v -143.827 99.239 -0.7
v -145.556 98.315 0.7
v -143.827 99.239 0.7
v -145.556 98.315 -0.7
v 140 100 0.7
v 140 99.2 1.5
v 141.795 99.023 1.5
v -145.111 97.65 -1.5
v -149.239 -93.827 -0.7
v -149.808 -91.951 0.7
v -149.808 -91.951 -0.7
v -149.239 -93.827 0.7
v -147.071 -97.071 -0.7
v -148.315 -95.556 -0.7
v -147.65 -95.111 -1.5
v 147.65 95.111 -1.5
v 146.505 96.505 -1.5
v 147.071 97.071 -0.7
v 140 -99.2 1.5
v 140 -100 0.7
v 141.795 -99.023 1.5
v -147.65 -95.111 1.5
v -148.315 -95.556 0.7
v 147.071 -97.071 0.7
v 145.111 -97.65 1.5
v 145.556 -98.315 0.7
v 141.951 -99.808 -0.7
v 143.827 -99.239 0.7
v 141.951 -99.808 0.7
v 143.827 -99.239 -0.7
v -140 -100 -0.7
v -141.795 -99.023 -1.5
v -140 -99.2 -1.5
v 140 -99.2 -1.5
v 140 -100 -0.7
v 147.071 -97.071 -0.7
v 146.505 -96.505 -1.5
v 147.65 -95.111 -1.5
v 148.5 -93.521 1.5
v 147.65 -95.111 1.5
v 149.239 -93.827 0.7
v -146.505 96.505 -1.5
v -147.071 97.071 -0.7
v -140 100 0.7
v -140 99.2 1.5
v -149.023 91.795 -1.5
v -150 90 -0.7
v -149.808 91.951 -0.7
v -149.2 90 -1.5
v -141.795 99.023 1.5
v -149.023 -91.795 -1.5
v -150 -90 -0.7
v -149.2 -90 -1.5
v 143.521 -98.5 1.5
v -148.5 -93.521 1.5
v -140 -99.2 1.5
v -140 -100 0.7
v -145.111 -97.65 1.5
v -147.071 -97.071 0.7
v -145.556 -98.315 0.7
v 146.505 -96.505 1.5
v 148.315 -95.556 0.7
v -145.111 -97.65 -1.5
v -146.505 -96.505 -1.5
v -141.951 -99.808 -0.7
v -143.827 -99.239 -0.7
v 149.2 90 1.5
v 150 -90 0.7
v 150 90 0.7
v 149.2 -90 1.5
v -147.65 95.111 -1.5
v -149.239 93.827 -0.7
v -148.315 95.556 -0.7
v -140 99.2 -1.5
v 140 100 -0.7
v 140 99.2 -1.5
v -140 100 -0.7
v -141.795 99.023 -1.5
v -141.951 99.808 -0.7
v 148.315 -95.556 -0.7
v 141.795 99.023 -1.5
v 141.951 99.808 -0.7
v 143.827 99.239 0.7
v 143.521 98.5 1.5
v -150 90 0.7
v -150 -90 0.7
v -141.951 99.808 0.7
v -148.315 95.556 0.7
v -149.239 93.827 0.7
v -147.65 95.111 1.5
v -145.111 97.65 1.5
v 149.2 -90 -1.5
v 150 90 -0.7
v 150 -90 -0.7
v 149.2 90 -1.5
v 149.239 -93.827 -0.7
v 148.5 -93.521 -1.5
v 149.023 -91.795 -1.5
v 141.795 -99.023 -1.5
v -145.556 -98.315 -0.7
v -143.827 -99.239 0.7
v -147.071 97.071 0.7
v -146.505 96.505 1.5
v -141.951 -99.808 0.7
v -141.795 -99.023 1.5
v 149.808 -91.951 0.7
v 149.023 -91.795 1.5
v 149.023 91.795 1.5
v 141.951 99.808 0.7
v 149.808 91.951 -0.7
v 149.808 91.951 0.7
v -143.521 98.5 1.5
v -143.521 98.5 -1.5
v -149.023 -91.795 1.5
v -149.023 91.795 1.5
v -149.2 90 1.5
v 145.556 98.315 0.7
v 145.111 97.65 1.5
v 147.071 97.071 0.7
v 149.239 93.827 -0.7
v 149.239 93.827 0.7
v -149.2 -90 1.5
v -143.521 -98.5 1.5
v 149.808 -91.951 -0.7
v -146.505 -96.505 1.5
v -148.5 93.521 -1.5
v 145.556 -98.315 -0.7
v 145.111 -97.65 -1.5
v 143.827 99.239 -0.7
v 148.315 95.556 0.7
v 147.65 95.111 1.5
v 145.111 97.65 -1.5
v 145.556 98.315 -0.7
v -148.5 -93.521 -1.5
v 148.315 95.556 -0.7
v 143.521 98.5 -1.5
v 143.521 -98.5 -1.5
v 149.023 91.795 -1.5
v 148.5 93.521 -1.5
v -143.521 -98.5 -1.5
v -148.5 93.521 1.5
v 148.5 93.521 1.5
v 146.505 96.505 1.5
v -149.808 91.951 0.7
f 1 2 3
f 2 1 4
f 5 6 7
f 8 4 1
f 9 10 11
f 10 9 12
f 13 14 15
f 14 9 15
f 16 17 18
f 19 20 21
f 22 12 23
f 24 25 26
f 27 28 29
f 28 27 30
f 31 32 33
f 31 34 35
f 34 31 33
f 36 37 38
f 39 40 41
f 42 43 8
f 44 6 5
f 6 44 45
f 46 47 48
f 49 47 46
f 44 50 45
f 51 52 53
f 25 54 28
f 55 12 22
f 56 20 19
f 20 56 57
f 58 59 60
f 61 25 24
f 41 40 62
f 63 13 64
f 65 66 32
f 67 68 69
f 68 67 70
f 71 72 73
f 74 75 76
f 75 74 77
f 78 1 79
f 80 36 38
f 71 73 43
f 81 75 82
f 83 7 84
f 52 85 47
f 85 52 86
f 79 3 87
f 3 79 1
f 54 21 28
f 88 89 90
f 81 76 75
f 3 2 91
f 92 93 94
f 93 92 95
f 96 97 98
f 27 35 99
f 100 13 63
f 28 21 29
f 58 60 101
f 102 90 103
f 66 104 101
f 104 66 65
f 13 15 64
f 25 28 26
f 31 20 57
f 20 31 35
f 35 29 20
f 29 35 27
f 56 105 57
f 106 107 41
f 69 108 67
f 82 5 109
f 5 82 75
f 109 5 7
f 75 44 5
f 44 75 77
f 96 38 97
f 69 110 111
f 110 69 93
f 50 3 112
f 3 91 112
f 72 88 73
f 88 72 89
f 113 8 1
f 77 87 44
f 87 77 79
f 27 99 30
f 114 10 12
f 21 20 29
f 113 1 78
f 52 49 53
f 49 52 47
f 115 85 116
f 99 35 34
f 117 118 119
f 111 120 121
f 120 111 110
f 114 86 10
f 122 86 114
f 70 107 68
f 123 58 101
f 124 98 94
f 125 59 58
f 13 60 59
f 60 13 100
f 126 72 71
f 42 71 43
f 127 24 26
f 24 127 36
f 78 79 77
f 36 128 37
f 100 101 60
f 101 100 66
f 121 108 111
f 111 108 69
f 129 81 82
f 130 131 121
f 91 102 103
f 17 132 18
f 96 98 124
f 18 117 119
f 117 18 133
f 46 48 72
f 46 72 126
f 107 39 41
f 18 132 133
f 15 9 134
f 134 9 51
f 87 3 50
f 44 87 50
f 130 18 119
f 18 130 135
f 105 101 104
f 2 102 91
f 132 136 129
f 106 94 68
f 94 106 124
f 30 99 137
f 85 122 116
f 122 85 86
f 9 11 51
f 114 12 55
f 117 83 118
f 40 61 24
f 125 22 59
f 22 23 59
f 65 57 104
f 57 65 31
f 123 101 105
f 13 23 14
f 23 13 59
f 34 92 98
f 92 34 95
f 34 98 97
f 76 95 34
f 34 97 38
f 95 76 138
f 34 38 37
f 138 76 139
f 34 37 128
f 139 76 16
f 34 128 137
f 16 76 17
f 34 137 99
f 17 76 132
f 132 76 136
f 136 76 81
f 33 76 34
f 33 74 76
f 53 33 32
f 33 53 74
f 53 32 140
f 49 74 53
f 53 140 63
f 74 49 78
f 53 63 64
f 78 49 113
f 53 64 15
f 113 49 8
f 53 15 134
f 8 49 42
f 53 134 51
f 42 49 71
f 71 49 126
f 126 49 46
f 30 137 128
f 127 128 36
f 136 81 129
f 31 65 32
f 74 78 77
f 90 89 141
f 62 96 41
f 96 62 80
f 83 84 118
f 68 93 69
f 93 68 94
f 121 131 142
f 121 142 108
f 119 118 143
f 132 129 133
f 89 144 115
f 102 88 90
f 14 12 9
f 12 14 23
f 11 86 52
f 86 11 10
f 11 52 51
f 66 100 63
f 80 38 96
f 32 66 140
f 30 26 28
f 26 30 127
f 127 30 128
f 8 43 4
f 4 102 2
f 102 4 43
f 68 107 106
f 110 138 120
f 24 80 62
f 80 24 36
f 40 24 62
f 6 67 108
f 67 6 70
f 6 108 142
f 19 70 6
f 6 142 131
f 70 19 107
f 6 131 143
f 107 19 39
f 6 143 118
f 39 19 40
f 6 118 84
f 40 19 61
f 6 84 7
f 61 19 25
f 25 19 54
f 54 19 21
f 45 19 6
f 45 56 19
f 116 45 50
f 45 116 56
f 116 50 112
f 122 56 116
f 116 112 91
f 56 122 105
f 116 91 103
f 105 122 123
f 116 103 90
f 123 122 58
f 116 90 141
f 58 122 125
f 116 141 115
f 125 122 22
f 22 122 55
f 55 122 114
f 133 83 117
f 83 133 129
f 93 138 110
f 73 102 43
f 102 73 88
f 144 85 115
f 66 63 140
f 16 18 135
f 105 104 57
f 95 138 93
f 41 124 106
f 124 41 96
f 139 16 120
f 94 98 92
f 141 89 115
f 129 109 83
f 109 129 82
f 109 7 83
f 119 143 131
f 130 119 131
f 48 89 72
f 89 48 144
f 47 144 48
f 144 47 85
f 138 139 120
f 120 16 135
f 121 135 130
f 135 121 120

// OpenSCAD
// Parameters
sheet_length = 300; //[150:600:1]
sheet_width = 200;  //[100:400:1]
sheet_thickness = 3; //[1.5:6:0.5]
corner_radius = 10; //[5:20:1]
chamfer_size = 0.8; //[0.3:2:0.1]
film_thickness = 0.08; //[0.03:0.2:0.01]
overlap = 1; //[0.5:2:0.1]
film_inset = 0.5; //[0.2:2:0.1]

$fn = 32;

// Helpers
function clamp(v, lo, hi) = v < lo ? lo : (v > hi ? hi : v);

// Keep parameters valid
r  = clamp(corner_radius, 0, min(sheet_length, sheet_width)/2);
c  = clamp(chamfer_size, 0, min(sheet_length, sheet_width)/2 - r);
fi = clamp(film_inset, 0, min(sheet_length, sheet_width)/2 - r);
eps = 0.01;

// 2D rounded rectangle (fast hull of 4 circles)
module rounded_rect_2d(L, W, R) {
    L2 = max(L, eps);
    W2 = max(W, eps);
    R2 = clamp(R, 0, min(L2, W2)/2);

    if (R2 <= 0)
        square([L2, W2], center=true);
    else
        hull() {
            for (sx = [-1, 1], sy = [-1, 1])
                translate([sx*(L2/2 - R2), sy*(W2/2 - R2)])
                    circle(r=R2);
        }
}

// Acrylic sheet with simplified chamfer (single hull between top/bottom outlines)
module acrylic_sheet() {
    if (c <= 0) {
        linear_extrude(height=sheet_thickness, center=true)
            rounded_rect_2d(sheet_length, sheet_width, r);
    } else {
        // Ensure inset outline stays valid
        L2 = max(sheet_length - 2*c, eps);
        W2 = max(sheet_width  - 2*c, eps);
        R2 = max(r - c, 0);

        hull() {
            // Top: inset outline
            translate([0,0, sheet_thickness/2 - c])
                linear_extrude(height=c, center=false)
                    rounded_rect_2d(L2, W2, R2);

            // Middle: full outline (gives flat faces)
            translate([0,0, -sheet_thickness/2 + c])
                linear_extrude(height=sheet_thickness - 2*c, center=false)
                    rounded_rect_2d(sheet_length, sheet_width, r);

            // Bottom: inset outline
            translate([0,0, -sheet_thickness/2])
                linear_extrude(height=c, center=false)
                    rounded_rect_2d(L2, W2, R2);
        }
    }
}

// Protective film layer (fused to sheet with overlap)
module protective_film() {
    Lf = max(sheet_length - 2*fi, eps);
    Wf = max(sheet_width  - 2*fi, eps);
    Rf = max(r - fi, 0);

    translate([0, 0, sheet_thickness/2 + film_thickness/2 - overlap])
        linear_extrude(height=film_thickness, center=true)
            rounded_rect_2d(Lf, Wf, Rf);
}

// Final Model (ONE connected solid)
color([0.85, 0.85, 0.8])
union() {
    acrylic_sheet();
    protective_film();
}
